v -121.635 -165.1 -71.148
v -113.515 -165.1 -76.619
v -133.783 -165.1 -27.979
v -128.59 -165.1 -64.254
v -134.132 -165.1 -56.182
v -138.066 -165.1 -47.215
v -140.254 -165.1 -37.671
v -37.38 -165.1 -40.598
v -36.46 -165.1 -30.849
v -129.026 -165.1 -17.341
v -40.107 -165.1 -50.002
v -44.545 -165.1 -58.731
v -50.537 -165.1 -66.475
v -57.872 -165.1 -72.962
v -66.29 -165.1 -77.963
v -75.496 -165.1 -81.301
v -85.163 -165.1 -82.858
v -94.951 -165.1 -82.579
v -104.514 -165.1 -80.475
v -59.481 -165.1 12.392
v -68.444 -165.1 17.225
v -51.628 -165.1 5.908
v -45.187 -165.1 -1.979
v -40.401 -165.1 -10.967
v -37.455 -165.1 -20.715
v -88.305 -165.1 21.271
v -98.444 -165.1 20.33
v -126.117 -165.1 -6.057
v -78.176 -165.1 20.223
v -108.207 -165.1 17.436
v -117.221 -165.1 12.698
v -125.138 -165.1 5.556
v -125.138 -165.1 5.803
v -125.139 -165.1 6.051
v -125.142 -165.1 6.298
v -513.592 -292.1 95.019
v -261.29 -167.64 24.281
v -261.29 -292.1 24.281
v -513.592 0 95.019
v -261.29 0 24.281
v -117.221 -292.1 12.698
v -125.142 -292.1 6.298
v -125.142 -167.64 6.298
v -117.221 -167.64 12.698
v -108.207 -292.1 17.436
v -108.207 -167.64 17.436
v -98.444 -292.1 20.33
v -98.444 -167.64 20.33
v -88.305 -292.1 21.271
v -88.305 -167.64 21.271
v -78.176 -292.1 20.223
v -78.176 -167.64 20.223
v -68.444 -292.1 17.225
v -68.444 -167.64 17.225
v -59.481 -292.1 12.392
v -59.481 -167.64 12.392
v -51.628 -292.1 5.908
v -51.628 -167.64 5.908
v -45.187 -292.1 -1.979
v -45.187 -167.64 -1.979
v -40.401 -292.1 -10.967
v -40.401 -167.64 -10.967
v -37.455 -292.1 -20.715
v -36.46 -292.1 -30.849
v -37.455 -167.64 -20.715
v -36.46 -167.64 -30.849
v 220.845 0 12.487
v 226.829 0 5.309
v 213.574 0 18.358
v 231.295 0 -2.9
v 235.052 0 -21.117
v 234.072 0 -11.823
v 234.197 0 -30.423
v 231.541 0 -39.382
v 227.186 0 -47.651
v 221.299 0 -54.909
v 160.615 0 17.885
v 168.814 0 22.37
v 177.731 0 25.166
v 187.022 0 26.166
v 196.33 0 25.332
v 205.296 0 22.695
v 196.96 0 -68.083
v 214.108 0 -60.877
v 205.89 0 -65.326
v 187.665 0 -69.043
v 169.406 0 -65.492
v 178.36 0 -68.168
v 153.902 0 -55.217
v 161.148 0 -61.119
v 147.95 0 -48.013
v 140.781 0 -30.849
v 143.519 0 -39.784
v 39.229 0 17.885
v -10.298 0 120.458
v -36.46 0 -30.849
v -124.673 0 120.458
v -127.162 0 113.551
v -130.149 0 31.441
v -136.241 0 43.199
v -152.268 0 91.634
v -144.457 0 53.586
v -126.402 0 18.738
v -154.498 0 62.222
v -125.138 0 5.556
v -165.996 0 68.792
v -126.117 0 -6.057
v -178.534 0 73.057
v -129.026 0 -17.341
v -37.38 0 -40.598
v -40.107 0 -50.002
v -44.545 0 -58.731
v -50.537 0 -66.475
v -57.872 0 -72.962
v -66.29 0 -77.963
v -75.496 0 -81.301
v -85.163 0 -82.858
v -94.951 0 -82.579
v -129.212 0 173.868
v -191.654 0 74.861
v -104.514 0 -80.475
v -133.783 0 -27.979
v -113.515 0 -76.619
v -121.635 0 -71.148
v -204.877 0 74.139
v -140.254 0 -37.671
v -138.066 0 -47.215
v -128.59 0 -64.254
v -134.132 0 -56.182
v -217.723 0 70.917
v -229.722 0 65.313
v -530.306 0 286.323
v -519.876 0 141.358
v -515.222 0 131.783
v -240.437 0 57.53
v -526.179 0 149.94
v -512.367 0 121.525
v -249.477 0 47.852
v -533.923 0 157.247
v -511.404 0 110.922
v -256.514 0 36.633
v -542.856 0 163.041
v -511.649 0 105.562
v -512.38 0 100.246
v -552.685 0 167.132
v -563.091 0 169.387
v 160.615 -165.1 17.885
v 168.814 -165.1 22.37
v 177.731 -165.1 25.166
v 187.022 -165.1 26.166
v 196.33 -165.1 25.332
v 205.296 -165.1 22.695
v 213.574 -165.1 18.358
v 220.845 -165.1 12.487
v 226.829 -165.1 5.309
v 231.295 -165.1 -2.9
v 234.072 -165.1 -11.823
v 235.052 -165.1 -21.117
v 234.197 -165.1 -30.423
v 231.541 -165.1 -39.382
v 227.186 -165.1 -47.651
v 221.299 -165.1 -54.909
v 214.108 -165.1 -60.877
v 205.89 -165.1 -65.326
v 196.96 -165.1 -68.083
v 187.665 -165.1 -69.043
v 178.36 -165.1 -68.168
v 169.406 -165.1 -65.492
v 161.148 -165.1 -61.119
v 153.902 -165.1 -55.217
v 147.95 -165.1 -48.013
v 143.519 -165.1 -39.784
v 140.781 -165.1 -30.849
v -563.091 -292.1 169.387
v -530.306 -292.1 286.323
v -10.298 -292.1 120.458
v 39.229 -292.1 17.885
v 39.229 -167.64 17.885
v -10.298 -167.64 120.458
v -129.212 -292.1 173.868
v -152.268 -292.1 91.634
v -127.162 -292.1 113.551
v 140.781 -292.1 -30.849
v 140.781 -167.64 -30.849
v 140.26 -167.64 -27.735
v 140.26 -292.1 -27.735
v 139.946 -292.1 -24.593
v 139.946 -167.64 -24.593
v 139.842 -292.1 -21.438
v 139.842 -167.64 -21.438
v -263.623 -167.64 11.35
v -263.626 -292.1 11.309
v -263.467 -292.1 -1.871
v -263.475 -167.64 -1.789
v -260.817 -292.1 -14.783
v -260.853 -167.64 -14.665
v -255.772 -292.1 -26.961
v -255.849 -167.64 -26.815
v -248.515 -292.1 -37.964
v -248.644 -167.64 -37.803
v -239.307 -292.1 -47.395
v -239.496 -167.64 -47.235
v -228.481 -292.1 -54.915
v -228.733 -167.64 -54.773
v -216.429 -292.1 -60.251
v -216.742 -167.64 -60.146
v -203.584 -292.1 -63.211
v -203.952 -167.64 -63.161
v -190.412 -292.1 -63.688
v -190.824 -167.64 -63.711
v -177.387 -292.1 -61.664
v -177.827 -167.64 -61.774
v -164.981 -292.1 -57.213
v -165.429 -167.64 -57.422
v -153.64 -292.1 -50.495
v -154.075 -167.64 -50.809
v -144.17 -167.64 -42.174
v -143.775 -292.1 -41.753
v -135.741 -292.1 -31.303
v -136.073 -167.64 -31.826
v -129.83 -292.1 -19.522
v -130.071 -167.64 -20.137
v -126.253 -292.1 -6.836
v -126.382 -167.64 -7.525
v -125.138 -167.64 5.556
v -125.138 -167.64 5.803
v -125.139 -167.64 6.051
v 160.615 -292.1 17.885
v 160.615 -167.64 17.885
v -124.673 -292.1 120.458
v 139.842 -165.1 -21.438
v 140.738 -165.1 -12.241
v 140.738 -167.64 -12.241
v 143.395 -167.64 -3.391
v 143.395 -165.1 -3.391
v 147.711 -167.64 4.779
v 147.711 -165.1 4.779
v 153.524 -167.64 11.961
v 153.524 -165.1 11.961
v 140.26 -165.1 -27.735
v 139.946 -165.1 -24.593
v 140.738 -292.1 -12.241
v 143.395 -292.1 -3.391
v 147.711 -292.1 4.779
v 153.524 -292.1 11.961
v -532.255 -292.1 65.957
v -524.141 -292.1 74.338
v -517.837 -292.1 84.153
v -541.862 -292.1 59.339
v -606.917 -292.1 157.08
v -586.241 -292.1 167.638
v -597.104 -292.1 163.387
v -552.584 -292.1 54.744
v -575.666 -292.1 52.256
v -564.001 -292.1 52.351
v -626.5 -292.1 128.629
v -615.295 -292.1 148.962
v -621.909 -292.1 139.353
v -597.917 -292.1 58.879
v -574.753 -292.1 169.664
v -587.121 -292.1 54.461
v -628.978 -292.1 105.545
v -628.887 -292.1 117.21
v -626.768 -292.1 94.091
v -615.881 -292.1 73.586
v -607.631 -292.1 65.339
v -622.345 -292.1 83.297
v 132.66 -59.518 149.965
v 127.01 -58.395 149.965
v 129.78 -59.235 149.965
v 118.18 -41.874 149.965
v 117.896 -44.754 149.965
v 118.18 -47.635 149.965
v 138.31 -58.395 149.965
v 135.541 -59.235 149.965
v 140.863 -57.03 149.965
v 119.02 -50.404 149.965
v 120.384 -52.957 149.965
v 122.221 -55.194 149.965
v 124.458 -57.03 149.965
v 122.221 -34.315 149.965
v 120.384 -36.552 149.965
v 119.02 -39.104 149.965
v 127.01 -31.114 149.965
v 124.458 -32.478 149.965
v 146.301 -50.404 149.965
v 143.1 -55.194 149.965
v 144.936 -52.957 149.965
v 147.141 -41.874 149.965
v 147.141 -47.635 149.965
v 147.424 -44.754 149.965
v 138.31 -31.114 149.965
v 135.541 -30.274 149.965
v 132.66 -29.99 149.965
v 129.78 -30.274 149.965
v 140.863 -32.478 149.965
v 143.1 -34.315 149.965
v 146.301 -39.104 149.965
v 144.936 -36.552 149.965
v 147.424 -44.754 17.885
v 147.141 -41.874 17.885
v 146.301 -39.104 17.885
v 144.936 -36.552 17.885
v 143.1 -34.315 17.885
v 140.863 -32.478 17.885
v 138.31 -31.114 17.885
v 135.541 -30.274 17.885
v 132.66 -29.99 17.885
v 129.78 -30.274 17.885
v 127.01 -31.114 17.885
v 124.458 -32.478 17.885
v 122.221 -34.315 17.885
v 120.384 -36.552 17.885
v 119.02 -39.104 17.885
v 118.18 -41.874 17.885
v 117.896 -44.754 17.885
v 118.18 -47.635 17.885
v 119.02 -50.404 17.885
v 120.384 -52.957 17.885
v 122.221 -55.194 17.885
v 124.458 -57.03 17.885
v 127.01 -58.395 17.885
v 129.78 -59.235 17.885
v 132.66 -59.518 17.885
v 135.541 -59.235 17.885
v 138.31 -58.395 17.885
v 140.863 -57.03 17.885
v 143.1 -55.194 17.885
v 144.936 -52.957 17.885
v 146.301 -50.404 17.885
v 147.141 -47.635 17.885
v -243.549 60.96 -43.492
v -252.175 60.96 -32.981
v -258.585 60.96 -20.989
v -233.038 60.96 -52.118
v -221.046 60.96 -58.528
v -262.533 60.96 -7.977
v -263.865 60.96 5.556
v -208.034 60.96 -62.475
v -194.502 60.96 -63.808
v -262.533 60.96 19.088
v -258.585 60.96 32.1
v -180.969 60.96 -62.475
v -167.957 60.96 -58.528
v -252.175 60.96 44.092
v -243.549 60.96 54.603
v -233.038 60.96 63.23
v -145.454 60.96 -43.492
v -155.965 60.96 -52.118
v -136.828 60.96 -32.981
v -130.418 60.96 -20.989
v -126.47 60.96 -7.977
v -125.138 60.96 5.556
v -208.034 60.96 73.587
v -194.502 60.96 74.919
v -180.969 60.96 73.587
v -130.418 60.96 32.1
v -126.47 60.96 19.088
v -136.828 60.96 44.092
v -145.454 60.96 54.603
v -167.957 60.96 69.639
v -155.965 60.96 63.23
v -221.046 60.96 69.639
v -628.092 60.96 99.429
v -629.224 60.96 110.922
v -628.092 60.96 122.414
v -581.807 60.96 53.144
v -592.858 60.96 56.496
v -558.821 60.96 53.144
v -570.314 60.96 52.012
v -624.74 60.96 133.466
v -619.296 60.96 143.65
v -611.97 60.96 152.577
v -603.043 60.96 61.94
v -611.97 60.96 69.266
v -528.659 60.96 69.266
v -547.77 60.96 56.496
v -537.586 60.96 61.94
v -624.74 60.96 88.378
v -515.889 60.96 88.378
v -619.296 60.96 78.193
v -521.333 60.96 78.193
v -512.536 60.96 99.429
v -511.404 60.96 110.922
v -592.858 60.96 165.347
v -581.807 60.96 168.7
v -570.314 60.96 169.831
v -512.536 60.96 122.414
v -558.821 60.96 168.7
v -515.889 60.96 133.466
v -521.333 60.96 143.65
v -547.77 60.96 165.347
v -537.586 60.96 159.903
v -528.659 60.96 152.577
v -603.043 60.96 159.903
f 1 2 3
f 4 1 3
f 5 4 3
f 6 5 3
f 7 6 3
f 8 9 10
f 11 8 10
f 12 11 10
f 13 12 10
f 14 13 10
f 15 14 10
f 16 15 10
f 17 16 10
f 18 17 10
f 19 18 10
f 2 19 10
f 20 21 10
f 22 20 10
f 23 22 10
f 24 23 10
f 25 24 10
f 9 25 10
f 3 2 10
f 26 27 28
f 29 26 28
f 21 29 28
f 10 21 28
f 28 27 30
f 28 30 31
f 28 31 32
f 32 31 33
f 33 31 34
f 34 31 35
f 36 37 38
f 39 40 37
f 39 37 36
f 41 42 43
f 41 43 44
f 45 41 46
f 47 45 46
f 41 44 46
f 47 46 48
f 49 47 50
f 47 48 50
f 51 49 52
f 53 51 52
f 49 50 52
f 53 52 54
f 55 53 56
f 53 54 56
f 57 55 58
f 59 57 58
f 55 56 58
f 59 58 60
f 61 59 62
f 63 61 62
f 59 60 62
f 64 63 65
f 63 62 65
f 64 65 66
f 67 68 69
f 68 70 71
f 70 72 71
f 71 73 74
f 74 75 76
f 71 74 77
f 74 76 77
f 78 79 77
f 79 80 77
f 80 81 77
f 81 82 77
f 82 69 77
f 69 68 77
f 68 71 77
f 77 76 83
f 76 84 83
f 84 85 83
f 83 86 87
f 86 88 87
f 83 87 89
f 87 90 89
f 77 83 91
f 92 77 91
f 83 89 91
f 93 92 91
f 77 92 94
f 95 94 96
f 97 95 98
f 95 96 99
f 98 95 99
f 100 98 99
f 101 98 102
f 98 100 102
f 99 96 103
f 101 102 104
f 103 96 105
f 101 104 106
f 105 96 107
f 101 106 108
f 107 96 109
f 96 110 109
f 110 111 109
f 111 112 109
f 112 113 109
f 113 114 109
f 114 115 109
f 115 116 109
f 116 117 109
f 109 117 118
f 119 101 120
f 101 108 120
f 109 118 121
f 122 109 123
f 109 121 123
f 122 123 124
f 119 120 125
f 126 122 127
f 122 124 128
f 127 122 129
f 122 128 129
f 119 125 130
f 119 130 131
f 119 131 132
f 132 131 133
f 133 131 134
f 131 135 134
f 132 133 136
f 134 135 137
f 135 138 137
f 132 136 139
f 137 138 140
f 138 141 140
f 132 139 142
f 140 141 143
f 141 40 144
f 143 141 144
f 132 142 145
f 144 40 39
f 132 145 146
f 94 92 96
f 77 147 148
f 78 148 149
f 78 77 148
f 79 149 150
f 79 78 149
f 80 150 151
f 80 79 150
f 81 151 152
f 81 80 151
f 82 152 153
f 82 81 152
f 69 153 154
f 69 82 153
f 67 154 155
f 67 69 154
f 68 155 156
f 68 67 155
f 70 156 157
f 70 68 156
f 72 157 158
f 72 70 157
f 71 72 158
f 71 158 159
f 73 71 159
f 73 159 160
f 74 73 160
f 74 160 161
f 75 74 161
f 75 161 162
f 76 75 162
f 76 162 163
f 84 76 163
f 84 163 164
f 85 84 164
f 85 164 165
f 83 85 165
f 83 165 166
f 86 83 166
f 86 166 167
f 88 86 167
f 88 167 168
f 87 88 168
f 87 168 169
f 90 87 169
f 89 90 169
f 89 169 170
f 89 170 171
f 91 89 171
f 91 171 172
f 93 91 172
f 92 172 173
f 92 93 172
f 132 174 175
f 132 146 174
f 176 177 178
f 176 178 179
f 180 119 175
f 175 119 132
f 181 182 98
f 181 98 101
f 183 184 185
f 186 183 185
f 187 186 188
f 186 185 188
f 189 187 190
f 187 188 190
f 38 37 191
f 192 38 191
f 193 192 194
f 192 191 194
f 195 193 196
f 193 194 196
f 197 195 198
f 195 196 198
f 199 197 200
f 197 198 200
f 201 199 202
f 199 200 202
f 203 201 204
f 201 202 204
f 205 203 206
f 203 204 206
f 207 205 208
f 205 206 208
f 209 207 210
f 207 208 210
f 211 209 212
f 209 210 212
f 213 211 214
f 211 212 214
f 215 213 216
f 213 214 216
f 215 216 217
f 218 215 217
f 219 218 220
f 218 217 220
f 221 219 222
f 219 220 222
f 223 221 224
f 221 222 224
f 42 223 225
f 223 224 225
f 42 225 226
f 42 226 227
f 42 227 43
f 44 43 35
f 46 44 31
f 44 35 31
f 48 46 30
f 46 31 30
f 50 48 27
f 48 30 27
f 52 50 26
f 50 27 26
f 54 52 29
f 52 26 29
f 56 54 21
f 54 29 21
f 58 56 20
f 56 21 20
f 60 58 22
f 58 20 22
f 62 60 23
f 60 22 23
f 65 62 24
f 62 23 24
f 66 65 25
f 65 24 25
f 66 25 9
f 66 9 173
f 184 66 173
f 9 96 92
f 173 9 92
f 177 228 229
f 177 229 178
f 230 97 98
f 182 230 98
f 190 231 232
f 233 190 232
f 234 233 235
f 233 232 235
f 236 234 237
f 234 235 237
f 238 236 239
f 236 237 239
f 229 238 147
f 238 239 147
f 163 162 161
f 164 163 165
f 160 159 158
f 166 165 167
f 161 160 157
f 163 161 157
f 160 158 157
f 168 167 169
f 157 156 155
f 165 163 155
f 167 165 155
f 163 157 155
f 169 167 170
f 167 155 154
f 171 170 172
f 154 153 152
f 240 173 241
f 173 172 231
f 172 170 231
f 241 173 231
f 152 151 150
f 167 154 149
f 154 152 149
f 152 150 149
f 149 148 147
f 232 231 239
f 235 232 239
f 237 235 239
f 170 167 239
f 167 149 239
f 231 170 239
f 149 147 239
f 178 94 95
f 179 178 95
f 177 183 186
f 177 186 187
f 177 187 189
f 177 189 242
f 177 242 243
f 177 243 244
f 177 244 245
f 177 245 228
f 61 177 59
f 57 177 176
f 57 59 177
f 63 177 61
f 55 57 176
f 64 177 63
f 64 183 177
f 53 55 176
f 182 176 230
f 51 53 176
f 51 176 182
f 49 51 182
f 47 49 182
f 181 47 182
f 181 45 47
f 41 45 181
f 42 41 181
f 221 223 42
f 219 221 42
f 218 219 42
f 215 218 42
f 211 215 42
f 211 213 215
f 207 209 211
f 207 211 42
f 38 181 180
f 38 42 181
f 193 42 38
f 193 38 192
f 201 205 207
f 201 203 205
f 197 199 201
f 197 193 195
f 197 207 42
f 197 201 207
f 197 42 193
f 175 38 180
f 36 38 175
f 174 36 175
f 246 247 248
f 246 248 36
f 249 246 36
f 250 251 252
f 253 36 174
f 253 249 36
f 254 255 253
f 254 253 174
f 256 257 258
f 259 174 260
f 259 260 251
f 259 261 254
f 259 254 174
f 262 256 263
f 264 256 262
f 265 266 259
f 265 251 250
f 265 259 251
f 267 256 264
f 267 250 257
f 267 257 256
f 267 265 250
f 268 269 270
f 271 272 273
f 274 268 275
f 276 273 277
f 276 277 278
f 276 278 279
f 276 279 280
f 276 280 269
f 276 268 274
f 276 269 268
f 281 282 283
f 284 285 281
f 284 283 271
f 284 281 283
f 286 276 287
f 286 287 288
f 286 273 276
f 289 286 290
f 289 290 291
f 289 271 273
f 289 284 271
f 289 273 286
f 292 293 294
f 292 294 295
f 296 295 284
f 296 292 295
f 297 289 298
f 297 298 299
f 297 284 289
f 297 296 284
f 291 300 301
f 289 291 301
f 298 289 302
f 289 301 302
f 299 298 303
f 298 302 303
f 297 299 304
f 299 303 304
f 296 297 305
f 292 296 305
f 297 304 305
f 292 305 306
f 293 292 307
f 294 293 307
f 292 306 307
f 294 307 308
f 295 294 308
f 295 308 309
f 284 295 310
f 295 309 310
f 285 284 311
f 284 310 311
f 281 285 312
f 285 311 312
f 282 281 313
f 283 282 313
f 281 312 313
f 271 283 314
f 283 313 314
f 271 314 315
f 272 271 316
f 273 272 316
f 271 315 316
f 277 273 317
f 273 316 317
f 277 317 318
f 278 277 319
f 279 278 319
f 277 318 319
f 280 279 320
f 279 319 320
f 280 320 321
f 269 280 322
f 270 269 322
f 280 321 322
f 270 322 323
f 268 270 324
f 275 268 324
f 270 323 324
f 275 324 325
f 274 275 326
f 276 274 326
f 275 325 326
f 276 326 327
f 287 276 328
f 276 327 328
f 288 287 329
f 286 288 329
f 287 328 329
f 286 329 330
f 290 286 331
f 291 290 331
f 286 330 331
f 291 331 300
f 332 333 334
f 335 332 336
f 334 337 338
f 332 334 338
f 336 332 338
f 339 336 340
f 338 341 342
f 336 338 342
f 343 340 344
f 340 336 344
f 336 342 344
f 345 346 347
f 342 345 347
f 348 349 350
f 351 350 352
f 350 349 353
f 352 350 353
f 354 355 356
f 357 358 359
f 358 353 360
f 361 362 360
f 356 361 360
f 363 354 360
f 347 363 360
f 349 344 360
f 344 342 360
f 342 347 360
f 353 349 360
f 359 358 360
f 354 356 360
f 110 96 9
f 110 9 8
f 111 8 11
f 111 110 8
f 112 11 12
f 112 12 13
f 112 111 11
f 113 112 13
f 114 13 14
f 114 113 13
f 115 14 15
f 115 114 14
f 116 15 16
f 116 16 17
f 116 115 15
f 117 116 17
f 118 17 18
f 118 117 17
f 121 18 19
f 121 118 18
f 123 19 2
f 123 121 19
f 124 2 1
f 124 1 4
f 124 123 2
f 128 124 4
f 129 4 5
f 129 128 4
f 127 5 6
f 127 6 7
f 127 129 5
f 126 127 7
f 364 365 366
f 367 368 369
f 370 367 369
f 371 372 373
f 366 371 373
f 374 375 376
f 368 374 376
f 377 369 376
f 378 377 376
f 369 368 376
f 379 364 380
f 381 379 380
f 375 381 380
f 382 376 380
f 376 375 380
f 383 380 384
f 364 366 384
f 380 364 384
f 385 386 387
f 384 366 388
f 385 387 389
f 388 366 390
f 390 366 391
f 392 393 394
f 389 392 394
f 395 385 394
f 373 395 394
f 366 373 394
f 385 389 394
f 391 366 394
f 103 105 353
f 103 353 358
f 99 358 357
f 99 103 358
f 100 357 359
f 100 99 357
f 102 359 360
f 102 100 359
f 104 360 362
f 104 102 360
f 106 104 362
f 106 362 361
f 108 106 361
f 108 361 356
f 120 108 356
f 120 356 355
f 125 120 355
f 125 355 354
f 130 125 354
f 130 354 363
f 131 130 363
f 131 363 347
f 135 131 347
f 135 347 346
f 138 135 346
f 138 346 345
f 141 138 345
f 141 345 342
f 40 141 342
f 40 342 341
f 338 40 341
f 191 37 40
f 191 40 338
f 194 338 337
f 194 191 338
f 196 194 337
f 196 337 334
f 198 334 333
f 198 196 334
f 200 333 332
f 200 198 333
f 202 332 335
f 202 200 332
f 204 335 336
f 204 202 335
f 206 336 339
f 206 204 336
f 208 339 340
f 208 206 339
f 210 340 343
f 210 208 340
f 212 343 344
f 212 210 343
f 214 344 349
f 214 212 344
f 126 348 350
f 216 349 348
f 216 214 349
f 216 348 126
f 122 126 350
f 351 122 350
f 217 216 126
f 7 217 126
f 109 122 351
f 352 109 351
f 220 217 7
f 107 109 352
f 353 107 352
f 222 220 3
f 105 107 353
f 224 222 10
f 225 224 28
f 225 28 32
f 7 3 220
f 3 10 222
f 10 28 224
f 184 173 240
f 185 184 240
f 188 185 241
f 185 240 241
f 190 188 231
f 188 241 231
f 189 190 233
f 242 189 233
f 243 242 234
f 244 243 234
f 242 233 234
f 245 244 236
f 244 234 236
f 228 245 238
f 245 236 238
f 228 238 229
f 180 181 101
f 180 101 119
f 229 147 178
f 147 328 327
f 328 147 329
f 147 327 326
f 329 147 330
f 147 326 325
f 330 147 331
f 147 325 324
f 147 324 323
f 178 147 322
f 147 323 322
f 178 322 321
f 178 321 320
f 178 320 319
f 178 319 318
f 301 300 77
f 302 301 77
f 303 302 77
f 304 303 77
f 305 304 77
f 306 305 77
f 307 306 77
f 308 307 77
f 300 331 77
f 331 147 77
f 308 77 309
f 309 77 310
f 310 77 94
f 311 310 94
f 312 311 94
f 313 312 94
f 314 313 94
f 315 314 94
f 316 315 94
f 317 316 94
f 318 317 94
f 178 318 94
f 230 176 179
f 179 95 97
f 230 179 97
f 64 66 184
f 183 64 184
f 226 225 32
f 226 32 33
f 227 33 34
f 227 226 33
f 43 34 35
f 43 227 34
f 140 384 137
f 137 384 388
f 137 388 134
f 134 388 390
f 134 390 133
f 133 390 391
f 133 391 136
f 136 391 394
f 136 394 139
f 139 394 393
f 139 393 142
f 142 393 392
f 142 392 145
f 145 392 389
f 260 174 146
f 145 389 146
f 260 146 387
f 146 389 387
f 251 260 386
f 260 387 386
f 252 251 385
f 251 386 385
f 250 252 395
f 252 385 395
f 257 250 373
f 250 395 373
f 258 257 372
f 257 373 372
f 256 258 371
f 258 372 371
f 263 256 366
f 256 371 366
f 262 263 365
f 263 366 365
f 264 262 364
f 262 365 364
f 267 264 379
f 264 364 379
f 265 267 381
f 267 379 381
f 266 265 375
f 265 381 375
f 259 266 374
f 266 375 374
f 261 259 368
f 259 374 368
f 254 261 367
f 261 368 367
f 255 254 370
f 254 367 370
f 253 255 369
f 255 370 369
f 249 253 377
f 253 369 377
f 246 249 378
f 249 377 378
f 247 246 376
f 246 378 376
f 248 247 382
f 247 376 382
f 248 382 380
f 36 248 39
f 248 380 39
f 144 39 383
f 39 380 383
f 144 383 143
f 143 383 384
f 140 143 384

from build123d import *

# Parameters (mm, degrees)
F1_DEPTH  = 114.3
F2_R      = 14.7641240752
F3_DEPTH  = 132.08
F5_DEPTH  = 165.1
F6_DEPTH  = 53.34
F7_W      = 167.64
F7_H      = 75.5490642041
F8_DEPTH  = 416.56
F9_DEPTH  = 104.14
F10_R     = 58.9096936167
F10_R_2   = 69.3638510651
F11_DEPTH = 228.6
F12_DEPTH = 124.46


with BuildPart() as f1:
    # F0 (on Front) → F1 (new body)
    with BuildSketch(Plane.XZ):
        Polygon((-152.2679626942, 91.6335880756), (-174.4953691959, 12.3544447124), (-143.3922946453, 68.4929564595), (-127.1618189825, 113.5505846584), align=None)
        Polygon((-143.3922946453, 68.4929564595), (-174.4953691959, 12.3544447124), (-88.5811317712, -30.8491028845), (-88.5811317712, 68.4929564595), align=None)
        Polygon((-127.1618189825, 113.5505846584), (-143.3922946453, 68.4929564595), (-88.5811317712, 68.4929564595), (-33.7699688971, 68.4929564595), (-10.2984756231, 120.4584985971), (-119.2487329245, 120.4584985971), align=None)
        Polygon((-88.5811317712, 68.4929564595), (-88.5811317712, -30.8491028845), (29.068255797, -30.8491028845), (8.9511722326, 17.8852565587), (-33.7699688971, 68.4929564595), align=None)
        Polygon((-124.6734783053, 120.4584985971), (-127.1618189825, 113.5505846584), (-119.2487329245, 120.4584985971), align=None)
        Polygon((8.9511722326, 17.8852565587), (29.068255797, -30.8491028845), (200.966194272, -30.8491028845), (200.966194272, 17.8852565587), (131.0636848211, 17.8852565587), (39.2291881144, 17.8852565587), align=None)
        Polygon((-10.2984756231, 120.4584985971), (-33.7699688971, 68.4929564595), (8.9511722326, 17.8852565587), (39.2291881144, 17.8852565587), align=None)
    extrude(amount=F1_DEPTH)

    # F2 (on face) → F3 (join)
    with BuildSketch(Plane.XY.offset(17.8852565587)):
        with Locations((132.660344243, -44.7543635964)):
            Circle(F2_R)
    extrude(amount=F3_DEPTH)

    # F4 (on face) → F5 (join)
    with BuildSketch(Plane(origin=(0, 0, 0), x_dir=(-1, 0, 0), z_dir=(0, 1, 0))):
        with BuildLine():
            ThreePointArc((140.7021095386, -30.8491028845), (88.5811317712, 21.2718748828), (36.4601540038, -30.8491028845))
            ThreePointArc((36.4601540038, -30.8491028845), (88.5811317712, -82.9700806519), (140.7021095386, -30.8491028845))
        make_face()
        with BuildLine():
            ThreePointArc((-139.8416826612, -21.4376766235), (-234.8171624105, -16.7085714313), (-140.7812567162, -30.8491028845))
            ThreePointArc((-140.7812567162, -30.8491028845), (-140.0771585543, -26.1667818156), (-139.8416826612, -21.4376766235))
        make_face()
    extrude(amount=-F5_DEPTH)

    # F6 (add): a face of the model
    f6_faces = [f1.faces().sort_by_distance(p)[0] for p in [
        (-32.0897758633, -114.3, 39.2066158894),
    ]]
    extrude(f6_faces, amount=F6_DEPTH)

    # F7 (on face) → F8 (join)
    with BuildSketch(Plane(origin=(-164.9898592959, 0, 46.2580259532), x_dir=(0, -1, 0), z_dir=(-0.9628717361, 0, 0.2699592929))):
        with Locations((83.82, -9.3836272135)):
            Rectangle(F7_W, F7_H)
    extrude(amount=F8_DEPTH)

    # F9 (add): a face of the model
    f9_faces = [f1.faces().sort_by_distance(p)[0] for p in [
        (-357.8723958787, -83.82, 129.8219473654),
    ]]
    extrude(f9_faces, amount=F9_DEPTH)

    # F10 (on face) → F11 (join)
    with BuildSketch(Plane.XZ.offset(167.64)):
        with Locations((-570.314151911, 110.9217789702)):
            Circle(F10_R)
        with Locations((-194.5015435206, 5.555610003)):
            Circle(F10_R_2)
    extrude(amount=-F11_DEPTH)

    # F12 (add): a face of the model
    f12_faces = [f1.faces().sort_by_distance(p)[0] for p in [
        (-283.3393159962, -167.64, 105.4244484486),
    ]]
    extrude(f12_faces, amount=F12_DEPTH)


solid = f1.part
